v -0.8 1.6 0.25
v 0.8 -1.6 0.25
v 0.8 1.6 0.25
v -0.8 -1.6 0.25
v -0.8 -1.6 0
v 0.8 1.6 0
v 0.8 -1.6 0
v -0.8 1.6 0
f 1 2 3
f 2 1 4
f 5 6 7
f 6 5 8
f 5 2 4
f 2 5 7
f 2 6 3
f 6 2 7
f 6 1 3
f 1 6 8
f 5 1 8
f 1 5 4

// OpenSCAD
/*
 * Creates a 1206 size passive
 *
 * Author: Ian McInerney
 * Created: March 23, 2015
 */

// The object
translate([0, 0, 0.125] ) {
	cube(size=[1.6,3.2,0.25], center=true);
}
